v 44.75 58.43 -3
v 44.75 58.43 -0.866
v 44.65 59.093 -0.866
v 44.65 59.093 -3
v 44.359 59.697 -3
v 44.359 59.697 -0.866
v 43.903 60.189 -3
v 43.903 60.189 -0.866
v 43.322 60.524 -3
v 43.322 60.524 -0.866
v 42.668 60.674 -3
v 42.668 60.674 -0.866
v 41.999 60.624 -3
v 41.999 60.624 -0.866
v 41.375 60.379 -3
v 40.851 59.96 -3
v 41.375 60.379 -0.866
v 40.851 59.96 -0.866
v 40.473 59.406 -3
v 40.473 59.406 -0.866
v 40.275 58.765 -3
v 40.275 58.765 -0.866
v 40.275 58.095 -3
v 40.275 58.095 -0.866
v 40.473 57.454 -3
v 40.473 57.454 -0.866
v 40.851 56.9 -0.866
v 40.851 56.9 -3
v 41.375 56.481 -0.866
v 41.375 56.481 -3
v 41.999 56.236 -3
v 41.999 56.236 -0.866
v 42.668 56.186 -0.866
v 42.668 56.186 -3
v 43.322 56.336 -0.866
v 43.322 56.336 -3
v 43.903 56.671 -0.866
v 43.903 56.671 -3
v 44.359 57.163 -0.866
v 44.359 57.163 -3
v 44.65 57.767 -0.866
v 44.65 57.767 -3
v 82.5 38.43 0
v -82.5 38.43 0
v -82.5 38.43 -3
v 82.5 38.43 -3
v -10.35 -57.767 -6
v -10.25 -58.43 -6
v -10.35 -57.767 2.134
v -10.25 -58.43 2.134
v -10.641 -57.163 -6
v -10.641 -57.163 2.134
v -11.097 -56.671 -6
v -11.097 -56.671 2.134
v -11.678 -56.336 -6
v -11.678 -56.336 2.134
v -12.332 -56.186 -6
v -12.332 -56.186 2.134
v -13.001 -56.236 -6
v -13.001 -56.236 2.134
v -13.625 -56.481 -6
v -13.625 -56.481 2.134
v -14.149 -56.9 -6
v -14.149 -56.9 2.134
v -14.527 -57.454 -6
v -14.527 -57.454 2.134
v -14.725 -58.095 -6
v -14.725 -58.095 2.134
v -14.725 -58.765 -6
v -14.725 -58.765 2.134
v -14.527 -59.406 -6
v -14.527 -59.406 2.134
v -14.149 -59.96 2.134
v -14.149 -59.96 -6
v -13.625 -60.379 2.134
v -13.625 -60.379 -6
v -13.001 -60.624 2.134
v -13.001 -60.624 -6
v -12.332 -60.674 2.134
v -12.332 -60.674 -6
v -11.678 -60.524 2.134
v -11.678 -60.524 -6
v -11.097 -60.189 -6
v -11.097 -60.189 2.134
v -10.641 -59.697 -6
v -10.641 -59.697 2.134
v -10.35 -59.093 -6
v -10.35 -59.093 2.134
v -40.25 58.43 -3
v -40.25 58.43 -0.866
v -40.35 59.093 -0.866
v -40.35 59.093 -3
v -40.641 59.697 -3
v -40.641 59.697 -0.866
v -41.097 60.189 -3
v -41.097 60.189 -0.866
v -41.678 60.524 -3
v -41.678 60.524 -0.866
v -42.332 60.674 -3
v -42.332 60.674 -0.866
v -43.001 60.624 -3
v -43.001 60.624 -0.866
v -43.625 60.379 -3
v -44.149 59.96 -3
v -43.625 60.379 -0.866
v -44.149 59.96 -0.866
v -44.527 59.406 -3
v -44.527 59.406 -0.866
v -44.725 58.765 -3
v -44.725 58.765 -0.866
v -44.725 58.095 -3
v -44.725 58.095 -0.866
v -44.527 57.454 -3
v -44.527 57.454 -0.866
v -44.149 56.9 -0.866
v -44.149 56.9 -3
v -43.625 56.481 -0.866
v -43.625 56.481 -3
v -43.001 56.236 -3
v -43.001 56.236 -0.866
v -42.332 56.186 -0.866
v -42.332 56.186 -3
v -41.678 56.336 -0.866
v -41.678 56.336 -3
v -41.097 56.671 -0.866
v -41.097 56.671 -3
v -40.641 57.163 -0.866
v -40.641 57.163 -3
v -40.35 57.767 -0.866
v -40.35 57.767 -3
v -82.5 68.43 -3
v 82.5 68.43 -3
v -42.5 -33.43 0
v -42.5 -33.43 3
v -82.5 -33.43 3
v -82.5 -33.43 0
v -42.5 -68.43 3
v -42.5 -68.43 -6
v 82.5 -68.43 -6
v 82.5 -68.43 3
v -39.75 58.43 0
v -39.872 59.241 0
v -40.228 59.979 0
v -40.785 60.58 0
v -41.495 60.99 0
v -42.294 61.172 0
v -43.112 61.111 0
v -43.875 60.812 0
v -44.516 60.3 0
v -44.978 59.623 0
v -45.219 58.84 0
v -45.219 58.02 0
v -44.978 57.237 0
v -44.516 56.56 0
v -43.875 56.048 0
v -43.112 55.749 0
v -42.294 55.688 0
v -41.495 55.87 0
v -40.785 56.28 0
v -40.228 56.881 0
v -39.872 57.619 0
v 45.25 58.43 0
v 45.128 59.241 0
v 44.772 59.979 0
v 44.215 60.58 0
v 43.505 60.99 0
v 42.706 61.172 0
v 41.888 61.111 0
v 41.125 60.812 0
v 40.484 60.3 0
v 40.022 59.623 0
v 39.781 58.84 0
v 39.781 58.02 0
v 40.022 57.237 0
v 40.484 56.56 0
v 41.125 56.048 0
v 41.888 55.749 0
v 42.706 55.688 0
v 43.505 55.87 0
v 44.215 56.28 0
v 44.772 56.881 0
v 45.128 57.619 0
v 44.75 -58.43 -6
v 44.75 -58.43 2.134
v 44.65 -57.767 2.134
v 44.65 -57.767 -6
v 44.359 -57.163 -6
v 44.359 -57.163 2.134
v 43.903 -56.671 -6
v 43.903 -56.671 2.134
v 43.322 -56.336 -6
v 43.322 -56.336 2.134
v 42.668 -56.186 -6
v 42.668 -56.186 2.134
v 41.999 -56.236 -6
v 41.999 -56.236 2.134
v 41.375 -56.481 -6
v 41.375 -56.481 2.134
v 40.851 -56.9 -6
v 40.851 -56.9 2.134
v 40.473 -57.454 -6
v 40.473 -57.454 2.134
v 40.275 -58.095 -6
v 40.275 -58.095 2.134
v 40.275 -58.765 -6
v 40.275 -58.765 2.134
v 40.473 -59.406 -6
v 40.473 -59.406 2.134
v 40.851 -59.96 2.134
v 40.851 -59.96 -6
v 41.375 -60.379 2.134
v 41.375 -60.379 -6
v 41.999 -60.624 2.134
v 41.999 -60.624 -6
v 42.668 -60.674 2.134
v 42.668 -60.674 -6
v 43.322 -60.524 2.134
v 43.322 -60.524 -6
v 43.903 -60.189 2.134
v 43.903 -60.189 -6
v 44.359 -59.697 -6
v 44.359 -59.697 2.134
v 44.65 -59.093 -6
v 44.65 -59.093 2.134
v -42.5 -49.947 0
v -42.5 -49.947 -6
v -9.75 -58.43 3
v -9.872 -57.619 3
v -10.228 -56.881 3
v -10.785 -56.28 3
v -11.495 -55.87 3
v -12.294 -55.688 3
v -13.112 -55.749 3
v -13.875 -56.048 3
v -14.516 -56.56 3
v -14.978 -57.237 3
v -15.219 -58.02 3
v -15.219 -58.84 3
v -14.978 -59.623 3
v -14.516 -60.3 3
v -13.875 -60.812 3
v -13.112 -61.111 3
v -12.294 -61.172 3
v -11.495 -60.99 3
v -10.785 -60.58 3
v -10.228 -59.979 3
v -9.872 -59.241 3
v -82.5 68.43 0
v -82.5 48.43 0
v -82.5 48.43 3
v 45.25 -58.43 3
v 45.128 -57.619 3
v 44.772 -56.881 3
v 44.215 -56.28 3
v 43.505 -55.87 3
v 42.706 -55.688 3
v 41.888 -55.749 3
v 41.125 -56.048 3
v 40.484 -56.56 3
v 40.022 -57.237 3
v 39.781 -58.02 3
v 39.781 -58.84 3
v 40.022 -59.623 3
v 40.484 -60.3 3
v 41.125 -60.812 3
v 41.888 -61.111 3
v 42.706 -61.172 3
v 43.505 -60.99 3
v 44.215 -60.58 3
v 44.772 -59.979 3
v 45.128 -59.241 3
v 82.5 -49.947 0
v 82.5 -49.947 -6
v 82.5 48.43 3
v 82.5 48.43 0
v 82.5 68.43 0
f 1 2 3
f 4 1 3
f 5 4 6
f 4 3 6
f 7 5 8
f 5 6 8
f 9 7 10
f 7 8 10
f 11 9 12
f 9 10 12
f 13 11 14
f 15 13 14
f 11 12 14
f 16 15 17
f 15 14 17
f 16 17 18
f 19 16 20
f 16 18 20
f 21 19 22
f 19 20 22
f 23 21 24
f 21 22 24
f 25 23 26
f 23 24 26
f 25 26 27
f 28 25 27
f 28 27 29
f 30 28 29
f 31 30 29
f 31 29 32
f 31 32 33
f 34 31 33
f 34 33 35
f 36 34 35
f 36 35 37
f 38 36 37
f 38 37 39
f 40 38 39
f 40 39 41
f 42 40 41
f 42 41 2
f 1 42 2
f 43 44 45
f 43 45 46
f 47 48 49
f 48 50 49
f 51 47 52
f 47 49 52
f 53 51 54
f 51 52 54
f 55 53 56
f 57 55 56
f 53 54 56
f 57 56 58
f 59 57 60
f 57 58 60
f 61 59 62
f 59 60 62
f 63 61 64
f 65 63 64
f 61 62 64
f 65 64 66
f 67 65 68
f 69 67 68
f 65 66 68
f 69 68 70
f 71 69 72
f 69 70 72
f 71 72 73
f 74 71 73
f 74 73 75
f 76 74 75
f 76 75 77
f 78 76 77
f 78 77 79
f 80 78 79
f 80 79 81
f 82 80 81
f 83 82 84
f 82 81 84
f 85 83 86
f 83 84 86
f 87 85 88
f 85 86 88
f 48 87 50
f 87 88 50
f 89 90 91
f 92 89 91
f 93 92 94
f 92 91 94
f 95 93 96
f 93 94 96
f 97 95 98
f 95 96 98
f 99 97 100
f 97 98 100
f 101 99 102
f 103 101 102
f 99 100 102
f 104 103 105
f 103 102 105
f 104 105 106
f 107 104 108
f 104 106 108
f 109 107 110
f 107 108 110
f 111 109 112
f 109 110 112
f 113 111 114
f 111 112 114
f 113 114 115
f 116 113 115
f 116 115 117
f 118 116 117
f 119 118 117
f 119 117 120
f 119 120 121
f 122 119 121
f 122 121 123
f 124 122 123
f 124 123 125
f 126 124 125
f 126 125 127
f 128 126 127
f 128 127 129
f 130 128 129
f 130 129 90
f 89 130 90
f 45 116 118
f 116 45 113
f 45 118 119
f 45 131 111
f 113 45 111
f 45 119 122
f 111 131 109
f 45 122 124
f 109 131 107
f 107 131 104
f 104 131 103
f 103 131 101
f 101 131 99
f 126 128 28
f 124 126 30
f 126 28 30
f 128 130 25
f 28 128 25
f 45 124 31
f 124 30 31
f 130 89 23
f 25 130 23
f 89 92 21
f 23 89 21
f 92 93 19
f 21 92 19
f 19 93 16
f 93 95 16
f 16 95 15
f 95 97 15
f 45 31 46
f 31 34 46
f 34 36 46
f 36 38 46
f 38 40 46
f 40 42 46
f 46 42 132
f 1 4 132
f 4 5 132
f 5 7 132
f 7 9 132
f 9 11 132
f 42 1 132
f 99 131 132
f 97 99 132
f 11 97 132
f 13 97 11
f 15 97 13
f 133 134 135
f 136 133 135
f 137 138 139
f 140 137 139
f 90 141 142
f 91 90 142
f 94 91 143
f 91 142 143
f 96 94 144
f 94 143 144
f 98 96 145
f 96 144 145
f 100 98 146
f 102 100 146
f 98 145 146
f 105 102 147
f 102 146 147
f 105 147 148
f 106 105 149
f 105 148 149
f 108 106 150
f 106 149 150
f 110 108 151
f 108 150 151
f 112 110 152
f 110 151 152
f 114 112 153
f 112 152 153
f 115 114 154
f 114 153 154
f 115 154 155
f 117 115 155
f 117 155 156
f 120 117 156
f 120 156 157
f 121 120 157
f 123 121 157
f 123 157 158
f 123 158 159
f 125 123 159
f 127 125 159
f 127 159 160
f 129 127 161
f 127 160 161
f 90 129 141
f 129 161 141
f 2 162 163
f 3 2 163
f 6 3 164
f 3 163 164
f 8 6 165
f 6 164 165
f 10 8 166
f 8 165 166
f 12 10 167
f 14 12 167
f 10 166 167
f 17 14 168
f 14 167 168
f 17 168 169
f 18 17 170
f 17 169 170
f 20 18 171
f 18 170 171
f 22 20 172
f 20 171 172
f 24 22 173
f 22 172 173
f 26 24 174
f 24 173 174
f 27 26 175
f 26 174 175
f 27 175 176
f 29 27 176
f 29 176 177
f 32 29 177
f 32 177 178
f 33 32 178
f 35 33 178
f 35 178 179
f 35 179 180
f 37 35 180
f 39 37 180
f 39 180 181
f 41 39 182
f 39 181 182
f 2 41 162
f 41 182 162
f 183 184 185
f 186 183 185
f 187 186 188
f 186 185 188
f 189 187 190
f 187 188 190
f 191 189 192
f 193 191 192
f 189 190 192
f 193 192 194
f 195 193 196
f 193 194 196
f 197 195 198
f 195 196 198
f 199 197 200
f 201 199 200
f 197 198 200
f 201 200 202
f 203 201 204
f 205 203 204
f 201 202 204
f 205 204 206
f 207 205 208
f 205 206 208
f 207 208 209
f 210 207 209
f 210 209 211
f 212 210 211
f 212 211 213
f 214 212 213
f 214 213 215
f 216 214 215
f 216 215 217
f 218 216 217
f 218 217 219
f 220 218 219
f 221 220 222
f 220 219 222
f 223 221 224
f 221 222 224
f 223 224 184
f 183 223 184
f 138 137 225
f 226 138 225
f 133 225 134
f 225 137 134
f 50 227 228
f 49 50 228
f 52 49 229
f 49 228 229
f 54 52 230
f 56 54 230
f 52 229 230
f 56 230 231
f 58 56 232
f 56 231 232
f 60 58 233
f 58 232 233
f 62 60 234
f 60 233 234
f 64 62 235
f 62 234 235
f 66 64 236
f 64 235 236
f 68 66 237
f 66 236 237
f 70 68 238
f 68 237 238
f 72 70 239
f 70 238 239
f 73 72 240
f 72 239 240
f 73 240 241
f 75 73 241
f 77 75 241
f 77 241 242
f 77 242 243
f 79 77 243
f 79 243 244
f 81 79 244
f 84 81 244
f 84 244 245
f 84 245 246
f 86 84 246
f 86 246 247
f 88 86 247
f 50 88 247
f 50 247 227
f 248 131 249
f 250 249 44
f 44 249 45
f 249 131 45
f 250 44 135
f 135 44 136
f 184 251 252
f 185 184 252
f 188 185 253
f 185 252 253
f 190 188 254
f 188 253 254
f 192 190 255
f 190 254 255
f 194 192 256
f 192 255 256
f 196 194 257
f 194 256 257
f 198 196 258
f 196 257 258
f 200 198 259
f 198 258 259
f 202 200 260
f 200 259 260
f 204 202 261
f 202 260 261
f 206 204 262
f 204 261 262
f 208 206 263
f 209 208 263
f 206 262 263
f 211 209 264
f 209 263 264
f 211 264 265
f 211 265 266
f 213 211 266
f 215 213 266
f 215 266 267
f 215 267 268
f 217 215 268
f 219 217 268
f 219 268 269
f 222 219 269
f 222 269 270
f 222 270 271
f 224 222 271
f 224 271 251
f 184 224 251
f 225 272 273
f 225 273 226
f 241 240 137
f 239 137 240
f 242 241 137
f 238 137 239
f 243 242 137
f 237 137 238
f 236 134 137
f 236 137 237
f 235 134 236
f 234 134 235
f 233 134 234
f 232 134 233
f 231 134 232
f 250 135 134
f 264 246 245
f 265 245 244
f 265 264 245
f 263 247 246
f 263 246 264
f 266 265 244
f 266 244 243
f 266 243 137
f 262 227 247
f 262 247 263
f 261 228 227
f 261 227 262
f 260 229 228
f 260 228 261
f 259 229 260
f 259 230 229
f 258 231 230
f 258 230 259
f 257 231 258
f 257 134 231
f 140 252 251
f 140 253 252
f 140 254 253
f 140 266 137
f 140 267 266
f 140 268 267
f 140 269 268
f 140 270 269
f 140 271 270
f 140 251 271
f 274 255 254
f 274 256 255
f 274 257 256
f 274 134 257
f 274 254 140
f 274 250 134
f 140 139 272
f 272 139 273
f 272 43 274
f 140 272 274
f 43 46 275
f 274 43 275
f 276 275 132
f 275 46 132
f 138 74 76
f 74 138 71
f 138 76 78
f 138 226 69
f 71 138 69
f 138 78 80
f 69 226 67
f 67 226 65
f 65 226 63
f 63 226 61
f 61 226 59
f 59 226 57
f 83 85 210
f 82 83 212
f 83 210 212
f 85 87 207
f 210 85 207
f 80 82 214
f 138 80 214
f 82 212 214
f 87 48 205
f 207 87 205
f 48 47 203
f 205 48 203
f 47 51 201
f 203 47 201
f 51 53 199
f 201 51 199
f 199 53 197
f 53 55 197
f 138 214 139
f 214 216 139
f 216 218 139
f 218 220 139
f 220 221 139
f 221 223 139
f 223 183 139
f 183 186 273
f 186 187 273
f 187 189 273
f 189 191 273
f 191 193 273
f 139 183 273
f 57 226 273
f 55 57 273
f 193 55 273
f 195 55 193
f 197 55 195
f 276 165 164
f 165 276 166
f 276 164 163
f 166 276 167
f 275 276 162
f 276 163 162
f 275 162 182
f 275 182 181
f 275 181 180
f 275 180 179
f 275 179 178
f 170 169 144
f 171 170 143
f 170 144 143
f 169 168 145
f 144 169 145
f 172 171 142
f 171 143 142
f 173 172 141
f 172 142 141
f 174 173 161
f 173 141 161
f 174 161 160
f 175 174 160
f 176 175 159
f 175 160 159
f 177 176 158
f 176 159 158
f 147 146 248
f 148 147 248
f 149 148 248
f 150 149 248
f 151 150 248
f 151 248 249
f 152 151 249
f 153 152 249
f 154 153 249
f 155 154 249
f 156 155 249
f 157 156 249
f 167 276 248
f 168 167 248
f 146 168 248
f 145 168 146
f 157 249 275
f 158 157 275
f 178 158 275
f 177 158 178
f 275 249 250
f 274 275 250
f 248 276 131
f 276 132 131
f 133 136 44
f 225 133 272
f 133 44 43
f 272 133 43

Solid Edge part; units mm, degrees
sketch "Sketch1" plane through (0, 0, 0) normal (0, 0, 1) x (1, 0, 0)
  line L0 (-82.5, -68.43) -> (82.5, -68.43)
  line L1 (82.5, -68.43) -> (82.5, 68.43)
  line L2 (82.5, 68.43) -> (-82.5, 68.43)
  line L3 (-82.5, 68.43) -> (-82.5, -68.43)
  dimension "D1" = 165
  dimension "D2" = 136.86
extrude "Extrusionsausprägung_1" add sketch "Sketch1" along normal blind 3
sketch "Sketch2" plane through (0, 0, 3) normal (0, 0, 1) x (1, 0, 0)
  line L0 (-82.5, -68.43) -> (-42.5, -68.43)
  line L1 (-42.5, -68.43) -> (-42.5, -33.43)
  line L2 (-42.5, -33.43) -> (-82.5, -33.43)
  line L3 (-82.5, -33.43) -> (-82.5, -68.43)
  dimension "D1" = 40
  dimension "D2" = 35
extrude "Cutout1" cut sketch "Sketch2" against normal through all
sketch "Sketch3" plane through (0, 0, 0) normal (0, 0, -1) x (-1, 0, 0)
  line L0 (-82.5, 68.43) -> (82.5, 68.43)
  line L1 (82.5, 68.43) -> (82.5, 38.43)
  line L2 (82.5, 38.43) -> (-82.5, 38.43)
  line L3 (-82.5, 38.43) -> (-82.5, 68.43)
  dimension "D1" = 30
  dimension "D2" = 165
extrude "Extrusionsausprägung_2" add sketch "Sketch3" along normal blind 3
sketch "Sketch4" plane through (-82.5, 17.5, 0) normal (-1, 0, 0) x (0, 1, 0)
  line L0 (50.93, 0) -> (30.93, 0)
  line L1 (30.93, 0) -> (30.93, -3)
  line L2 (30.93, -3) -> (50.93, -3)
  line L3 (50.93, -3) -> (50.93, 0)
  dimension "D1" = 20
  dimension "D2" = 3
extrude "Cutout2" cut sketch "Sketch4" against normal through all
sketch "Sketch5" plane through (0, -15, 0) normal (0, 0, -1) x (1, 0, 0)
  line L0 (-42.5, 53.43) -> (82.5, 53.43)
  line L1 (82.5, 53.43) -> (82.5, 34.9466)
  line L2 (82.5, 34.9466) -> (-42.5, 34.9466)
  line L3 (-42.5, 34.9466) -> (-42.5, 53.43)
extrude "Extrusionsausprägung_3" add sketch "Sketch5" along normal blind 6
sketch "Sketch6" plane through (0, 0, 3) normal (0, 0, 1) x (1, 0, 0)
  circle A0 centre (42.5, 58.43) radius 2.25
  circle A1 centre (42.5, -58.43) radius 2.25
  circle A2 centre (-12.5, -58.43) radius 2.25
  circle A3 centre (-42.5, 58.43) radius 2.25
  dimension "D1" = 4.5
  dimension "D2" = 85
  dimension "D3" = 40
  dimension "D4" = 10
  dimension "D5" = 55
  dimension "D6" = 10
extrude "Extrusionsausschnitt_1" cut sketch "Sketch6" against normal blind 245.2559
chamfer "Fase_1" distance 0.5 angle 60 4 edges at (-14.75, -58.43, 3) (40.25, -58.43, 3) (42.5, 56.18, 0) (-42.5, 56.18, 0) measured on face at (-56.65, -8.8314, 3)
properties material "Nylon, allgemein"
